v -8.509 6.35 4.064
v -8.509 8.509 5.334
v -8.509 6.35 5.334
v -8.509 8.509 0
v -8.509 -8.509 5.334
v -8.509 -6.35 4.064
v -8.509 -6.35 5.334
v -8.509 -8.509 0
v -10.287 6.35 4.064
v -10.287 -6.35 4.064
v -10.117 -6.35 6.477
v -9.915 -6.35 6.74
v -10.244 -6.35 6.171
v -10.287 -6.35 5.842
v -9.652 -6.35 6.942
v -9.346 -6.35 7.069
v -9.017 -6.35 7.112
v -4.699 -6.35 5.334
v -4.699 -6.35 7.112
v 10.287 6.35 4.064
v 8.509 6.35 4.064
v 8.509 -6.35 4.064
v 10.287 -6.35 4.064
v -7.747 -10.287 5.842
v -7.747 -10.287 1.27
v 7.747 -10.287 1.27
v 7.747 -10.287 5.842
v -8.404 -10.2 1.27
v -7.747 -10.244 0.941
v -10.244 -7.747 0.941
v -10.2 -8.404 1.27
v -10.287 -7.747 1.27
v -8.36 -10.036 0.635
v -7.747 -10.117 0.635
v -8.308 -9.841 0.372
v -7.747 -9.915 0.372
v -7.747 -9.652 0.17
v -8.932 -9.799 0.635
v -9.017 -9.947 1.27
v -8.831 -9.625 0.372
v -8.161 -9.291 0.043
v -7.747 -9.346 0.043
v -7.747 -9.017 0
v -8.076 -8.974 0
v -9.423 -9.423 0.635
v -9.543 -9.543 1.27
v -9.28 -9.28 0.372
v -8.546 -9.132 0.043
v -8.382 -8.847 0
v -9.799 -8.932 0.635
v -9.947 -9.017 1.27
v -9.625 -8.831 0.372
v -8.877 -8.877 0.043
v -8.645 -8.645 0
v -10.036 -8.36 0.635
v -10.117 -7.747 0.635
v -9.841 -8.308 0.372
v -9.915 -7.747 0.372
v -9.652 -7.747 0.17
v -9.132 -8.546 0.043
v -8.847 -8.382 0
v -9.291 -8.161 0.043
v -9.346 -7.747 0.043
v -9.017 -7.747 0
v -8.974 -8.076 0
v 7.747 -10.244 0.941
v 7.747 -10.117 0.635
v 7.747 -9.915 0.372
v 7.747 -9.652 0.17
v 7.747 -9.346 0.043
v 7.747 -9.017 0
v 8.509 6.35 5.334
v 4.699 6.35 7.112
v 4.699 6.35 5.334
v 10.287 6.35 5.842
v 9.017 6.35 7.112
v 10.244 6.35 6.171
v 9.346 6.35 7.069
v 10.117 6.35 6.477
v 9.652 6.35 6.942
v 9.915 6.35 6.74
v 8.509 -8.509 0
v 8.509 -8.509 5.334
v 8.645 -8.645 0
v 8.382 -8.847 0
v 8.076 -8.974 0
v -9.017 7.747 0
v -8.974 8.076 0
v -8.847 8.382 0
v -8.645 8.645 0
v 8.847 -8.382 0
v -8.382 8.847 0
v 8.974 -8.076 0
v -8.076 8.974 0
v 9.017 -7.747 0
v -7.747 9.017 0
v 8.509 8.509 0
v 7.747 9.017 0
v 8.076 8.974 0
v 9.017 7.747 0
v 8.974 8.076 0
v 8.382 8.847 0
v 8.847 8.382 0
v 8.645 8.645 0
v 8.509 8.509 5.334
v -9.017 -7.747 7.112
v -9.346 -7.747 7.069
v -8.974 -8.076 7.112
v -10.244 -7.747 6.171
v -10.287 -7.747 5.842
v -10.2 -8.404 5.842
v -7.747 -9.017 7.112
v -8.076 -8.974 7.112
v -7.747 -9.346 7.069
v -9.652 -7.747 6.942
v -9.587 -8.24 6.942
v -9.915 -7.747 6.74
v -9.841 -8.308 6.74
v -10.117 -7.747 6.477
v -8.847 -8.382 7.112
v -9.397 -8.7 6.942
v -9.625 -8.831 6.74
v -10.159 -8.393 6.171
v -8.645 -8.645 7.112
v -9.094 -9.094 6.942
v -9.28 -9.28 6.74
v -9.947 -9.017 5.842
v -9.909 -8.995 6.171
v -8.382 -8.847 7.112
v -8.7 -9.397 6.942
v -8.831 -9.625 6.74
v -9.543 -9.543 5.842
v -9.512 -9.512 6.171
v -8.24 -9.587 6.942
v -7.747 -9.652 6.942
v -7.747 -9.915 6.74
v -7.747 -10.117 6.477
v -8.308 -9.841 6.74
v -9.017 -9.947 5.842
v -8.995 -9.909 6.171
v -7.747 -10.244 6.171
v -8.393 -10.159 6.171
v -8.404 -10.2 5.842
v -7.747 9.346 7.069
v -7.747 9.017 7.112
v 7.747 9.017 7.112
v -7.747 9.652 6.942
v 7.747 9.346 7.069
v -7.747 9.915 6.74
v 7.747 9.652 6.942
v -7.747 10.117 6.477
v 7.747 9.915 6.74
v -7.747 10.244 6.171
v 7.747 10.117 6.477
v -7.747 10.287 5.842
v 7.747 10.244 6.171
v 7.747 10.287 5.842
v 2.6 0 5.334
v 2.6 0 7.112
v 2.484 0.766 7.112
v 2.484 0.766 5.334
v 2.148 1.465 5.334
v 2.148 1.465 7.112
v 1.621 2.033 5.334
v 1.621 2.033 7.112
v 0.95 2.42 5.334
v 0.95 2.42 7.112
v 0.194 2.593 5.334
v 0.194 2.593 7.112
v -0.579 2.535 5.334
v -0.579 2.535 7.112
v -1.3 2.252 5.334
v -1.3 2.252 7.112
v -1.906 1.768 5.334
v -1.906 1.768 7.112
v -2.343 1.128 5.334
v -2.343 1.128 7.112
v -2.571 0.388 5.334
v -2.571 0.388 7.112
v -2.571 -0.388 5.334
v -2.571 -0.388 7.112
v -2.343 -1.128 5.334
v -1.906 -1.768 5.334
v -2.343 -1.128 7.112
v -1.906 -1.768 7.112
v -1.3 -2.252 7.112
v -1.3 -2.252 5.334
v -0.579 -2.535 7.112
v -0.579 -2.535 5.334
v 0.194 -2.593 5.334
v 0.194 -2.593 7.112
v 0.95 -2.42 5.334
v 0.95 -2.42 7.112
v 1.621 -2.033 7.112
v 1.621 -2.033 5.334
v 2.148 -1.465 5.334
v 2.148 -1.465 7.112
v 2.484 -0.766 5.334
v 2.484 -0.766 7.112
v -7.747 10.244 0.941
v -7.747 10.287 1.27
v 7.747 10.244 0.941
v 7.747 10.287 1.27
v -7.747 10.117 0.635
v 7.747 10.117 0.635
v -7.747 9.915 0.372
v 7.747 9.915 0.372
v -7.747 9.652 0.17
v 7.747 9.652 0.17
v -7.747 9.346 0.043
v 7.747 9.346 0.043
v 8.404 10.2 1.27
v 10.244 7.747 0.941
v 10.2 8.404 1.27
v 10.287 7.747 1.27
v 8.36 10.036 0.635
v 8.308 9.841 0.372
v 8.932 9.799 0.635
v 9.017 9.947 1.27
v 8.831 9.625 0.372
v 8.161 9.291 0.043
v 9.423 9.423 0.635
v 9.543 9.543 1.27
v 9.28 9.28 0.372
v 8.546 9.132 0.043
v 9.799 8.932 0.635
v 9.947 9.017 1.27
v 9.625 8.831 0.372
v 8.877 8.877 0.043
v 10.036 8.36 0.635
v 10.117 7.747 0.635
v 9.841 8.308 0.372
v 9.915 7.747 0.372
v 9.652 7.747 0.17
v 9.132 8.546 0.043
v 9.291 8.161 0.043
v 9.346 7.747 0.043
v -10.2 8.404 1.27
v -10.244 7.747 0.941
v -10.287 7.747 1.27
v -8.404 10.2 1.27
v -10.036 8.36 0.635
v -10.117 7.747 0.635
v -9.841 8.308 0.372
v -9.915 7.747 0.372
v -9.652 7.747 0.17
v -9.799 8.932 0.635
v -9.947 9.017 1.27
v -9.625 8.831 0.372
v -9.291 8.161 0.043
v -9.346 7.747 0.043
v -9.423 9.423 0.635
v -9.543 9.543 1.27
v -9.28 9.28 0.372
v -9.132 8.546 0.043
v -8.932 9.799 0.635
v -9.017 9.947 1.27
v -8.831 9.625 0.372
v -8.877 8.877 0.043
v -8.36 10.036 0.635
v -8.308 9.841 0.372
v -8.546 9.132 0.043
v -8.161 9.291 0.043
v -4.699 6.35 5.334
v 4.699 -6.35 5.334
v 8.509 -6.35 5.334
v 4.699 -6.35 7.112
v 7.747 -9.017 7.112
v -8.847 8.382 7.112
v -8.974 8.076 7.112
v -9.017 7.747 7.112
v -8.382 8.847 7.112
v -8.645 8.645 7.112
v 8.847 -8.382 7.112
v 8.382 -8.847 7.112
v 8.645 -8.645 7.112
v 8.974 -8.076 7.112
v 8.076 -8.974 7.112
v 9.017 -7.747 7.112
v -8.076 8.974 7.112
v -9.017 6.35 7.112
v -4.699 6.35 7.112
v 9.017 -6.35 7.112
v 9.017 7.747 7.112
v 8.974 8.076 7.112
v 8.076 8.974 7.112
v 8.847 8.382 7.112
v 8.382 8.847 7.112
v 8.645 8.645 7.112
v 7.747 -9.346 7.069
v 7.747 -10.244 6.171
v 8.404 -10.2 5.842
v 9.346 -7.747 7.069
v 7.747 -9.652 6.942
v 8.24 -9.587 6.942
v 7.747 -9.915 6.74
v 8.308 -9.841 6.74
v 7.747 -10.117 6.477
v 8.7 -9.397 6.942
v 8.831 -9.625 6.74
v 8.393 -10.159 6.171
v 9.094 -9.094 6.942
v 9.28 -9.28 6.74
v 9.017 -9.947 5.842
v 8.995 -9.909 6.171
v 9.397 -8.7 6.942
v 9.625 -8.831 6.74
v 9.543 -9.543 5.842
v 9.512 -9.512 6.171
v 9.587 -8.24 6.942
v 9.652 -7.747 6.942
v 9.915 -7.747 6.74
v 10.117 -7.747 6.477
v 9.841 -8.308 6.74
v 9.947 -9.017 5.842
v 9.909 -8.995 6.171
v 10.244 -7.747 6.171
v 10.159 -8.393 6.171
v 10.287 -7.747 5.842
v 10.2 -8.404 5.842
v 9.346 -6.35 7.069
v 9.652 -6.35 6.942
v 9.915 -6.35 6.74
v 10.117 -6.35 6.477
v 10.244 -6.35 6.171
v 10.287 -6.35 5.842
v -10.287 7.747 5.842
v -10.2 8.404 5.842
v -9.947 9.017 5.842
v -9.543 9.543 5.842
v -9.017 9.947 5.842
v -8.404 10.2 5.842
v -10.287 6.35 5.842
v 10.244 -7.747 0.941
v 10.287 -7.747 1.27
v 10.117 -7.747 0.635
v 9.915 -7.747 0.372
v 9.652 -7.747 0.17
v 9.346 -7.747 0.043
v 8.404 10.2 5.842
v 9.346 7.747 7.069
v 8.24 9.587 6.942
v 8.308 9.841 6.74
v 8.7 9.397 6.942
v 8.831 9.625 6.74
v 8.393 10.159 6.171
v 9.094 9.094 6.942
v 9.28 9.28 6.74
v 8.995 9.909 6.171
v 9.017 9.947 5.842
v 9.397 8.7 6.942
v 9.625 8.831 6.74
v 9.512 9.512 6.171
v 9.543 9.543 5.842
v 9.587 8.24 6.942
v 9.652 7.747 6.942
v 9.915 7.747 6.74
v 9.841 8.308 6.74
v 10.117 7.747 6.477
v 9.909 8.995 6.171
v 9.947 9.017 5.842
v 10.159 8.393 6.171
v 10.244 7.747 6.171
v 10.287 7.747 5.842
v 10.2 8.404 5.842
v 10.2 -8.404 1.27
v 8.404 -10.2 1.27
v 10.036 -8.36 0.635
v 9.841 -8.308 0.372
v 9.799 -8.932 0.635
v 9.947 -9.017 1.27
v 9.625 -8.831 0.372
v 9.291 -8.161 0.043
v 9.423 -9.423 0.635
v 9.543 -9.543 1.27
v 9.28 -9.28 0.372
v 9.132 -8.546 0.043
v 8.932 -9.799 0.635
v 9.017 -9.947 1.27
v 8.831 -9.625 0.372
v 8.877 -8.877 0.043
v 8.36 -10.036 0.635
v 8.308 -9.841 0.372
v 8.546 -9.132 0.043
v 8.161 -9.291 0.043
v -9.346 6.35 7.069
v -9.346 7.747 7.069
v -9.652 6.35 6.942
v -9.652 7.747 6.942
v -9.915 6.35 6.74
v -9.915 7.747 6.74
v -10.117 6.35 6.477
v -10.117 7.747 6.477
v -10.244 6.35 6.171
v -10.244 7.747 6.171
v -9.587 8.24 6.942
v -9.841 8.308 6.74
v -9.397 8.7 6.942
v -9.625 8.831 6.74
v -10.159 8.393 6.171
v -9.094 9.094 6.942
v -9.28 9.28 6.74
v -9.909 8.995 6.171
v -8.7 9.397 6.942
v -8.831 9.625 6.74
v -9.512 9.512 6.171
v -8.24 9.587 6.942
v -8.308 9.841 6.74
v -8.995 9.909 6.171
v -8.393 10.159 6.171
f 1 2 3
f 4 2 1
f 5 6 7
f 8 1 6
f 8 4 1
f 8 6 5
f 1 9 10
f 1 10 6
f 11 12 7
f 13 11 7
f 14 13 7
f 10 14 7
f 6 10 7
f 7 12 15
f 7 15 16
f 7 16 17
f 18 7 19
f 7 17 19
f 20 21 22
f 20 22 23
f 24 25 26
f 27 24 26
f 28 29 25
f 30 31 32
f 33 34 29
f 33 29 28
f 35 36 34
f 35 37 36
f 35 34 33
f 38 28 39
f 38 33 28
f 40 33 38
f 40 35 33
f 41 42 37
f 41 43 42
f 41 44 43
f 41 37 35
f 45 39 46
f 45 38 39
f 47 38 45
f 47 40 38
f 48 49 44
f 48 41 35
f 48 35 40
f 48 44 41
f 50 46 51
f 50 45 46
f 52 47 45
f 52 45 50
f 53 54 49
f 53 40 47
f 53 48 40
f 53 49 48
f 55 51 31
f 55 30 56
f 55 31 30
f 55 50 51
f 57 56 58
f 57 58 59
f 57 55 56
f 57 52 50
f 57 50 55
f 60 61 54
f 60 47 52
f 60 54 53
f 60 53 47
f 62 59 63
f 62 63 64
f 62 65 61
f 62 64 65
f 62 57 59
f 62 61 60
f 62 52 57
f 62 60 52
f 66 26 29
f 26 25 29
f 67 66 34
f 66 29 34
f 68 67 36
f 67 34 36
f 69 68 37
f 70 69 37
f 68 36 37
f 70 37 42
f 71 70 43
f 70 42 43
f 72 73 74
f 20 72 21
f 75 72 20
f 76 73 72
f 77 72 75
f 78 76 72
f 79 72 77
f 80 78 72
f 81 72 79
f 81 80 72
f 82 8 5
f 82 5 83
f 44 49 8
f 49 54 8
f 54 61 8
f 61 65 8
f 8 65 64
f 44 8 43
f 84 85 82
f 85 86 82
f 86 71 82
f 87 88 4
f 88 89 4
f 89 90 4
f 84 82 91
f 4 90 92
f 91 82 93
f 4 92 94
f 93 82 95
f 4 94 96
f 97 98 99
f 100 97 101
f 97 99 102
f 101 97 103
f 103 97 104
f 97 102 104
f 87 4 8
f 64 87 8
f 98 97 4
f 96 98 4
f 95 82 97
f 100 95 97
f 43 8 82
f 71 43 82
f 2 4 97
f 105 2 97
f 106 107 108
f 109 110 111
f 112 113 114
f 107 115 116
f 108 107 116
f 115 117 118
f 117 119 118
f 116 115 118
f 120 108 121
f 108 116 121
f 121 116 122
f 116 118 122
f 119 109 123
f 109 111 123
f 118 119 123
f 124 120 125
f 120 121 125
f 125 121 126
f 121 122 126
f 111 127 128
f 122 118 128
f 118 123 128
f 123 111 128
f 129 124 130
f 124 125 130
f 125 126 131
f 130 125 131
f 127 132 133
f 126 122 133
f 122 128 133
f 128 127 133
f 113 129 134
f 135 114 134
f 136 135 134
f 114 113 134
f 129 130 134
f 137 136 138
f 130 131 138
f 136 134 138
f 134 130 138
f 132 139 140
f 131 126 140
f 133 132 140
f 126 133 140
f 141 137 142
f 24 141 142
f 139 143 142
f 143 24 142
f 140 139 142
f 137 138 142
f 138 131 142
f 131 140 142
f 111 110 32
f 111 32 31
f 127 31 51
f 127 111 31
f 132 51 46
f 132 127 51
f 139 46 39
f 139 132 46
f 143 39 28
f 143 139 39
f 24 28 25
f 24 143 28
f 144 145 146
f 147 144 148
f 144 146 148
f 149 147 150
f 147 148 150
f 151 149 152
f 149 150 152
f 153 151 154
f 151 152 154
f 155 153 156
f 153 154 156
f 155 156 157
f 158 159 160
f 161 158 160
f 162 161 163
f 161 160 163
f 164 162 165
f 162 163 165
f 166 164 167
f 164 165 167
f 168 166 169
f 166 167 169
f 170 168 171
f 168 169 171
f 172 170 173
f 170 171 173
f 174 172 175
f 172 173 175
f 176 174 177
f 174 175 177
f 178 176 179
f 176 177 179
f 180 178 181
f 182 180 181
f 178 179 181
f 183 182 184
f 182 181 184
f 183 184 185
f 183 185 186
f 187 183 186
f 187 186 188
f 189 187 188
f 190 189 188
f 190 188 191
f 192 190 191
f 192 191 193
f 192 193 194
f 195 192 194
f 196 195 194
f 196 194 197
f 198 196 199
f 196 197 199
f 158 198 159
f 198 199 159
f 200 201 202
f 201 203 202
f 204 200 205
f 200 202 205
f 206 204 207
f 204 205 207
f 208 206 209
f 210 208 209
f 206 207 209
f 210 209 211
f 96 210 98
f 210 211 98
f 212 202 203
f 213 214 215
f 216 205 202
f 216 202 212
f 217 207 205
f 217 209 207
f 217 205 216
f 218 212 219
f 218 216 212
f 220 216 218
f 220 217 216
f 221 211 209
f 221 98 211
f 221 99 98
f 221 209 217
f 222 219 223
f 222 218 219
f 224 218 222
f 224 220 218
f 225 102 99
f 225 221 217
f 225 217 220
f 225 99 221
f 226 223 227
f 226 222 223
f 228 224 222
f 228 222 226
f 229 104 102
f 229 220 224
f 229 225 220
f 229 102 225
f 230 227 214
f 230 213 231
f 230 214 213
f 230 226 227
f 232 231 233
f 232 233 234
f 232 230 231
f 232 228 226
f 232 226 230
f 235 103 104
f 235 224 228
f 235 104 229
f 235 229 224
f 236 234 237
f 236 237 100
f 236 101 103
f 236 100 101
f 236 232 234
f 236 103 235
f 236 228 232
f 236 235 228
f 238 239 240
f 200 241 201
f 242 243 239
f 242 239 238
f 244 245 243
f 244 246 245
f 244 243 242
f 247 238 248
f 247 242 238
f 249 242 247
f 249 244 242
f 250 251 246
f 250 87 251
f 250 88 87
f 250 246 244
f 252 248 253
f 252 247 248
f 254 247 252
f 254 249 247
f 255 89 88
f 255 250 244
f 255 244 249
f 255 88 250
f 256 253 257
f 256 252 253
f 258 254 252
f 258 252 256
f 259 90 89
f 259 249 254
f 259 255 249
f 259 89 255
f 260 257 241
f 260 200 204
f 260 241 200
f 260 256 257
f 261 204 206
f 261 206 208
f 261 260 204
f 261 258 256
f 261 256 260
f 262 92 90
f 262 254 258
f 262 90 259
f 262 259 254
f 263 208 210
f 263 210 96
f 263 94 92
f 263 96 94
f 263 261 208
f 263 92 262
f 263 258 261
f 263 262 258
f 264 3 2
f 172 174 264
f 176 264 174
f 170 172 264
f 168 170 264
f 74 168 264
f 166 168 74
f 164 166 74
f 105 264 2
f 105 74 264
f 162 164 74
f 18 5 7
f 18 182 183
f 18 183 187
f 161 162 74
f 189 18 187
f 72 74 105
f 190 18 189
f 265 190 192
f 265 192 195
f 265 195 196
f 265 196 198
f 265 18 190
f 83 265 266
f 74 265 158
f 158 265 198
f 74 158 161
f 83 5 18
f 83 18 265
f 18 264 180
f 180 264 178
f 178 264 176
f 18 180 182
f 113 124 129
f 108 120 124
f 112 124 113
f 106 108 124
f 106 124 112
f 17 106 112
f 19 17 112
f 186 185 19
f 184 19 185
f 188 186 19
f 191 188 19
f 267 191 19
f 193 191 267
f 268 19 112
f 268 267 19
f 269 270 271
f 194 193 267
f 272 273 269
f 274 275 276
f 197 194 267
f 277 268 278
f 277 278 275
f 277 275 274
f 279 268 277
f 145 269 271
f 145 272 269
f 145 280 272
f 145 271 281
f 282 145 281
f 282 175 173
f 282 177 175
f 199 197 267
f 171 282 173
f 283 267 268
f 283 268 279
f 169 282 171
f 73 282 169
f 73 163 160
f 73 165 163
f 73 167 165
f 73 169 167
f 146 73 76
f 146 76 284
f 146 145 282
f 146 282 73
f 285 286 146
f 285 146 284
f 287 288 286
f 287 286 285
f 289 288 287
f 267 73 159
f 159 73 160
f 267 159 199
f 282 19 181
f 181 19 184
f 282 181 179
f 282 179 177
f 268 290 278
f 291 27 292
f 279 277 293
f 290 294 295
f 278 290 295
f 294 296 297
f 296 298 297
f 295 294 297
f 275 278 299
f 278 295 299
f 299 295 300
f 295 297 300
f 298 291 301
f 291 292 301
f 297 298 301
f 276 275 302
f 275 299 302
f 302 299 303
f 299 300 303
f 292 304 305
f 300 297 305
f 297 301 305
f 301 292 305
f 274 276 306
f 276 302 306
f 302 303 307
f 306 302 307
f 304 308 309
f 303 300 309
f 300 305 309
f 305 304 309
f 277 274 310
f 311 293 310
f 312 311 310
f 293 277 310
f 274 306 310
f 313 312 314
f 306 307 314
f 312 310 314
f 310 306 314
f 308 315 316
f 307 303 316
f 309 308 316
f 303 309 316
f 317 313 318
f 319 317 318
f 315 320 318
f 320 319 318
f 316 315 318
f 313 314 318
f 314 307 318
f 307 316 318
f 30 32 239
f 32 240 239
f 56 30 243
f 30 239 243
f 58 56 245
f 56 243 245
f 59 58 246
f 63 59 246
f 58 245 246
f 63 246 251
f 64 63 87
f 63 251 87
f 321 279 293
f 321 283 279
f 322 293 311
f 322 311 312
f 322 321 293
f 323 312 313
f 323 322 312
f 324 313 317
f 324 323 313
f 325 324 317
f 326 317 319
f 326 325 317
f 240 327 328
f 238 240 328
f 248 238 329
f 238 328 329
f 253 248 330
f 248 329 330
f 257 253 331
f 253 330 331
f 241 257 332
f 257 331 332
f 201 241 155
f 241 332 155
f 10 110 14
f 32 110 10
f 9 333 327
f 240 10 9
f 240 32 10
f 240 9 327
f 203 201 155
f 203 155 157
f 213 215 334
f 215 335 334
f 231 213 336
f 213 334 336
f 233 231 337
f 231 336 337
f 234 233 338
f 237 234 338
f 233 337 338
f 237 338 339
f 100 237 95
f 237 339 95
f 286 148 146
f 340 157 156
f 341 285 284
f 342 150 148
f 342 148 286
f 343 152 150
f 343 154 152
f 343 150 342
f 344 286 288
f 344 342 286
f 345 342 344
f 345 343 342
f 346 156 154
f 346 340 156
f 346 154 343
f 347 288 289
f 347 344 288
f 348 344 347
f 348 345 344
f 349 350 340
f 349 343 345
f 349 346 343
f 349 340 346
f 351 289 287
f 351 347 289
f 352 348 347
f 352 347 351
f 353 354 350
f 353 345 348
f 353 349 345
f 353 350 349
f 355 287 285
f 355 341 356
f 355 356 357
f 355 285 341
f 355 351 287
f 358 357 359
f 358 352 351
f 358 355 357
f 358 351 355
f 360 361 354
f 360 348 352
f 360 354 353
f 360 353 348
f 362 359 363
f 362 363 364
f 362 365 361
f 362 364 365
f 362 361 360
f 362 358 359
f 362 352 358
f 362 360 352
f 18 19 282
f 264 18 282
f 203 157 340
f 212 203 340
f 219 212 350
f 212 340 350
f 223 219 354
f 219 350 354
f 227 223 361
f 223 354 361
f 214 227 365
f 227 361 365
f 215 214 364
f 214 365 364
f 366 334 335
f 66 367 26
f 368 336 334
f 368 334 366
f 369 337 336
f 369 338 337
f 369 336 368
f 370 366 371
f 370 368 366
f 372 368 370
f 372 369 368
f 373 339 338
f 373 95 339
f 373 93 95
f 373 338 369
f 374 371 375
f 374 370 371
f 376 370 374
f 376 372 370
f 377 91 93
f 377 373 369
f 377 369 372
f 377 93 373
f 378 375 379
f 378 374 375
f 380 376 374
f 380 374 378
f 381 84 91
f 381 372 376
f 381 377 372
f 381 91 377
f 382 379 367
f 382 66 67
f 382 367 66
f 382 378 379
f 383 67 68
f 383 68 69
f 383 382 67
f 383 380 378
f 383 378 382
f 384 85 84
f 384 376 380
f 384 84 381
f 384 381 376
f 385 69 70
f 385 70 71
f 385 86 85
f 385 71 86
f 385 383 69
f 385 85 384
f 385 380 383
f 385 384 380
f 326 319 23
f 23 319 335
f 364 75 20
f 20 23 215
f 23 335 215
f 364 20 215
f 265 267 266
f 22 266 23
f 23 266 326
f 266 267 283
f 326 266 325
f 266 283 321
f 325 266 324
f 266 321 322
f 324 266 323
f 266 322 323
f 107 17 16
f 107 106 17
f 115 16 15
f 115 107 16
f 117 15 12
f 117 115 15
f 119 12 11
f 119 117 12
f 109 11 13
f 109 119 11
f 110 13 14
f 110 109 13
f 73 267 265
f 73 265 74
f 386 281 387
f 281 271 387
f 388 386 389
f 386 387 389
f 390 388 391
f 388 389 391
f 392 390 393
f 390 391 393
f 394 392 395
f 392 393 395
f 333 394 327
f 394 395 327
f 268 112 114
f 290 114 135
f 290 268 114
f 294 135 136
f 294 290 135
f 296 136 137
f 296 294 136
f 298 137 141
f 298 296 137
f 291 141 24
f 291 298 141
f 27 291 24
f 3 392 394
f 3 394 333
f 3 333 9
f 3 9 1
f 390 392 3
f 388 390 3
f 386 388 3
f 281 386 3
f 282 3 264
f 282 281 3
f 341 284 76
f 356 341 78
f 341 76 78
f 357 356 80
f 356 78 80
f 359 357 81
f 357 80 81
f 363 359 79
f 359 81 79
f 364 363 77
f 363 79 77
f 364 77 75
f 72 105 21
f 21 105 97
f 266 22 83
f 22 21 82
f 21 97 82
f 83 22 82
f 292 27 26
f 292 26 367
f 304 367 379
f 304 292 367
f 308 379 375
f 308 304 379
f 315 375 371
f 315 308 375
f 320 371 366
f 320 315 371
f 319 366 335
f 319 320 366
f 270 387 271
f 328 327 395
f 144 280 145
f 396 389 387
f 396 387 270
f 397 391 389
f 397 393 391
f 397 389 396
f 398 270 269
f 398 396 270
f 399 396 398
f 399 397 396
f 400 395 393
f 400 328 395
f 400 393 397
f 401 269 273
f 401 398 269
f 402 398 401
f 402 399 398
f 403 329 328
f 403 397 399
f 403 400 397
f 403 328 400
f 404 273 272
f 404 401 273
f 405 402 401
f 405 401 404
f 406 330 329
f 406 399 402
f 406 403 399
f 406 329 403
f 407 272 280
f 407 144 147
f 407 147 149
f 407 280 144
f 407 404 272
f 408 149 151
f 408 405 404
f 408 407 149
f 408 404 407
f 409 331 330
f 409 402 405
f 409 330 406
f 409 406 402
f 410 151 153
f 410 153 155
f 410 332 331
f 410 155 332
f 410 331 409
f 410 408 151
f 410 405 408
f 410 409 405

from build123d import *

# Parameters (mm, degrees)
F0_W      = 20.574
F0_H      = 20.574
F1_DEPTH  = 7.112
F2_W      = 17.018
F2_H      = 17.018
F3_DEPTH  = 5.334
F4_R      = 2.54
F5_W      = 5.588
F5_H      = 12.7
F6_DEPTH  = 3.048
F7_W      = 11.176
F7_H      = 12.7
F8_DEPTH  = 3.048
F9_R      = 2.6
F10_DEPTH = 1.778
F11_R     = 1.27
F12_R     = 1.27


with BuildPart() as f1:
    # F0 (on Top) → F1 (new body)
    with BuildSketch(Plane.XY):
        Rectangle(F0_W, F0_H)
    extrude(amount=F1_DEPTH)

    # F2 (on face) → F3 (cut)
    with BuildSketch(Plane(origin=(0, 0, 0), x_dir=(1, 0, 0), z_dir=(0, 0, -1))):
        Rectangle(F2_W, F2_H)
    extrude(amount=-F3_DEPTH, mode=Mode.SUBTRACT)

    # F4
    f4_edges = [f1.edges().sort_by_distance(p)[0] for p in [
        (-10.287, -10.287, 3.556),
        (10.287, 10.287, 3.556),
        (10.287, -10.287, 3.556),
        (-10.287, 10.287, 3.556),
    ]]
    fillet(f4_edges, radius=F4_R)

    # F5 (on face) → F6 (cut)
    with BuildSketch(Plane.XY.offset(7.112)):
        with Locations((-7.493, 0)):
            Rectangle(F5_W, F5_H)
    extrude(amount=-F6_DEPTH, mode=Mode.SUBTRACT)

    # F7 (on face) → F8 (cut)
    with BuildSketch(Plane.XY.offset(7.112)):
        with Locations((10.287, 0)):
            Rectangle(F7_W, F7_H)
    extrude(amount=-F8_DEPTH, mode=Mode.SUBTRACT)

    # F9 (on face) → F10 (cut)
    with BuildSketch(Plane.XY.offset(7.112)):
        Circle(F9_R)
    extrude(amount=-F10_DEPTH, mode=Mode.SUBTRACT)

    # F11
    f11_edges = [f1.edges().sort_by_distance(p)[0] for p in [
        (0, 10.287, 7.112),
        (0, -10.287, 7.112),
    ]]
    fillet(f11_edges, radius=F11_R)

    # F12
    f12_edges = [f1.edges().sort_by_distance(p)[0] for p in [
        (-10.287, 0, 0),
        (0, 10.287, 0),
        (-9.543051, 9.543051, 0),
    ]]
    fillet(f12_edges, radius=F12_R)


solid = f1.part
